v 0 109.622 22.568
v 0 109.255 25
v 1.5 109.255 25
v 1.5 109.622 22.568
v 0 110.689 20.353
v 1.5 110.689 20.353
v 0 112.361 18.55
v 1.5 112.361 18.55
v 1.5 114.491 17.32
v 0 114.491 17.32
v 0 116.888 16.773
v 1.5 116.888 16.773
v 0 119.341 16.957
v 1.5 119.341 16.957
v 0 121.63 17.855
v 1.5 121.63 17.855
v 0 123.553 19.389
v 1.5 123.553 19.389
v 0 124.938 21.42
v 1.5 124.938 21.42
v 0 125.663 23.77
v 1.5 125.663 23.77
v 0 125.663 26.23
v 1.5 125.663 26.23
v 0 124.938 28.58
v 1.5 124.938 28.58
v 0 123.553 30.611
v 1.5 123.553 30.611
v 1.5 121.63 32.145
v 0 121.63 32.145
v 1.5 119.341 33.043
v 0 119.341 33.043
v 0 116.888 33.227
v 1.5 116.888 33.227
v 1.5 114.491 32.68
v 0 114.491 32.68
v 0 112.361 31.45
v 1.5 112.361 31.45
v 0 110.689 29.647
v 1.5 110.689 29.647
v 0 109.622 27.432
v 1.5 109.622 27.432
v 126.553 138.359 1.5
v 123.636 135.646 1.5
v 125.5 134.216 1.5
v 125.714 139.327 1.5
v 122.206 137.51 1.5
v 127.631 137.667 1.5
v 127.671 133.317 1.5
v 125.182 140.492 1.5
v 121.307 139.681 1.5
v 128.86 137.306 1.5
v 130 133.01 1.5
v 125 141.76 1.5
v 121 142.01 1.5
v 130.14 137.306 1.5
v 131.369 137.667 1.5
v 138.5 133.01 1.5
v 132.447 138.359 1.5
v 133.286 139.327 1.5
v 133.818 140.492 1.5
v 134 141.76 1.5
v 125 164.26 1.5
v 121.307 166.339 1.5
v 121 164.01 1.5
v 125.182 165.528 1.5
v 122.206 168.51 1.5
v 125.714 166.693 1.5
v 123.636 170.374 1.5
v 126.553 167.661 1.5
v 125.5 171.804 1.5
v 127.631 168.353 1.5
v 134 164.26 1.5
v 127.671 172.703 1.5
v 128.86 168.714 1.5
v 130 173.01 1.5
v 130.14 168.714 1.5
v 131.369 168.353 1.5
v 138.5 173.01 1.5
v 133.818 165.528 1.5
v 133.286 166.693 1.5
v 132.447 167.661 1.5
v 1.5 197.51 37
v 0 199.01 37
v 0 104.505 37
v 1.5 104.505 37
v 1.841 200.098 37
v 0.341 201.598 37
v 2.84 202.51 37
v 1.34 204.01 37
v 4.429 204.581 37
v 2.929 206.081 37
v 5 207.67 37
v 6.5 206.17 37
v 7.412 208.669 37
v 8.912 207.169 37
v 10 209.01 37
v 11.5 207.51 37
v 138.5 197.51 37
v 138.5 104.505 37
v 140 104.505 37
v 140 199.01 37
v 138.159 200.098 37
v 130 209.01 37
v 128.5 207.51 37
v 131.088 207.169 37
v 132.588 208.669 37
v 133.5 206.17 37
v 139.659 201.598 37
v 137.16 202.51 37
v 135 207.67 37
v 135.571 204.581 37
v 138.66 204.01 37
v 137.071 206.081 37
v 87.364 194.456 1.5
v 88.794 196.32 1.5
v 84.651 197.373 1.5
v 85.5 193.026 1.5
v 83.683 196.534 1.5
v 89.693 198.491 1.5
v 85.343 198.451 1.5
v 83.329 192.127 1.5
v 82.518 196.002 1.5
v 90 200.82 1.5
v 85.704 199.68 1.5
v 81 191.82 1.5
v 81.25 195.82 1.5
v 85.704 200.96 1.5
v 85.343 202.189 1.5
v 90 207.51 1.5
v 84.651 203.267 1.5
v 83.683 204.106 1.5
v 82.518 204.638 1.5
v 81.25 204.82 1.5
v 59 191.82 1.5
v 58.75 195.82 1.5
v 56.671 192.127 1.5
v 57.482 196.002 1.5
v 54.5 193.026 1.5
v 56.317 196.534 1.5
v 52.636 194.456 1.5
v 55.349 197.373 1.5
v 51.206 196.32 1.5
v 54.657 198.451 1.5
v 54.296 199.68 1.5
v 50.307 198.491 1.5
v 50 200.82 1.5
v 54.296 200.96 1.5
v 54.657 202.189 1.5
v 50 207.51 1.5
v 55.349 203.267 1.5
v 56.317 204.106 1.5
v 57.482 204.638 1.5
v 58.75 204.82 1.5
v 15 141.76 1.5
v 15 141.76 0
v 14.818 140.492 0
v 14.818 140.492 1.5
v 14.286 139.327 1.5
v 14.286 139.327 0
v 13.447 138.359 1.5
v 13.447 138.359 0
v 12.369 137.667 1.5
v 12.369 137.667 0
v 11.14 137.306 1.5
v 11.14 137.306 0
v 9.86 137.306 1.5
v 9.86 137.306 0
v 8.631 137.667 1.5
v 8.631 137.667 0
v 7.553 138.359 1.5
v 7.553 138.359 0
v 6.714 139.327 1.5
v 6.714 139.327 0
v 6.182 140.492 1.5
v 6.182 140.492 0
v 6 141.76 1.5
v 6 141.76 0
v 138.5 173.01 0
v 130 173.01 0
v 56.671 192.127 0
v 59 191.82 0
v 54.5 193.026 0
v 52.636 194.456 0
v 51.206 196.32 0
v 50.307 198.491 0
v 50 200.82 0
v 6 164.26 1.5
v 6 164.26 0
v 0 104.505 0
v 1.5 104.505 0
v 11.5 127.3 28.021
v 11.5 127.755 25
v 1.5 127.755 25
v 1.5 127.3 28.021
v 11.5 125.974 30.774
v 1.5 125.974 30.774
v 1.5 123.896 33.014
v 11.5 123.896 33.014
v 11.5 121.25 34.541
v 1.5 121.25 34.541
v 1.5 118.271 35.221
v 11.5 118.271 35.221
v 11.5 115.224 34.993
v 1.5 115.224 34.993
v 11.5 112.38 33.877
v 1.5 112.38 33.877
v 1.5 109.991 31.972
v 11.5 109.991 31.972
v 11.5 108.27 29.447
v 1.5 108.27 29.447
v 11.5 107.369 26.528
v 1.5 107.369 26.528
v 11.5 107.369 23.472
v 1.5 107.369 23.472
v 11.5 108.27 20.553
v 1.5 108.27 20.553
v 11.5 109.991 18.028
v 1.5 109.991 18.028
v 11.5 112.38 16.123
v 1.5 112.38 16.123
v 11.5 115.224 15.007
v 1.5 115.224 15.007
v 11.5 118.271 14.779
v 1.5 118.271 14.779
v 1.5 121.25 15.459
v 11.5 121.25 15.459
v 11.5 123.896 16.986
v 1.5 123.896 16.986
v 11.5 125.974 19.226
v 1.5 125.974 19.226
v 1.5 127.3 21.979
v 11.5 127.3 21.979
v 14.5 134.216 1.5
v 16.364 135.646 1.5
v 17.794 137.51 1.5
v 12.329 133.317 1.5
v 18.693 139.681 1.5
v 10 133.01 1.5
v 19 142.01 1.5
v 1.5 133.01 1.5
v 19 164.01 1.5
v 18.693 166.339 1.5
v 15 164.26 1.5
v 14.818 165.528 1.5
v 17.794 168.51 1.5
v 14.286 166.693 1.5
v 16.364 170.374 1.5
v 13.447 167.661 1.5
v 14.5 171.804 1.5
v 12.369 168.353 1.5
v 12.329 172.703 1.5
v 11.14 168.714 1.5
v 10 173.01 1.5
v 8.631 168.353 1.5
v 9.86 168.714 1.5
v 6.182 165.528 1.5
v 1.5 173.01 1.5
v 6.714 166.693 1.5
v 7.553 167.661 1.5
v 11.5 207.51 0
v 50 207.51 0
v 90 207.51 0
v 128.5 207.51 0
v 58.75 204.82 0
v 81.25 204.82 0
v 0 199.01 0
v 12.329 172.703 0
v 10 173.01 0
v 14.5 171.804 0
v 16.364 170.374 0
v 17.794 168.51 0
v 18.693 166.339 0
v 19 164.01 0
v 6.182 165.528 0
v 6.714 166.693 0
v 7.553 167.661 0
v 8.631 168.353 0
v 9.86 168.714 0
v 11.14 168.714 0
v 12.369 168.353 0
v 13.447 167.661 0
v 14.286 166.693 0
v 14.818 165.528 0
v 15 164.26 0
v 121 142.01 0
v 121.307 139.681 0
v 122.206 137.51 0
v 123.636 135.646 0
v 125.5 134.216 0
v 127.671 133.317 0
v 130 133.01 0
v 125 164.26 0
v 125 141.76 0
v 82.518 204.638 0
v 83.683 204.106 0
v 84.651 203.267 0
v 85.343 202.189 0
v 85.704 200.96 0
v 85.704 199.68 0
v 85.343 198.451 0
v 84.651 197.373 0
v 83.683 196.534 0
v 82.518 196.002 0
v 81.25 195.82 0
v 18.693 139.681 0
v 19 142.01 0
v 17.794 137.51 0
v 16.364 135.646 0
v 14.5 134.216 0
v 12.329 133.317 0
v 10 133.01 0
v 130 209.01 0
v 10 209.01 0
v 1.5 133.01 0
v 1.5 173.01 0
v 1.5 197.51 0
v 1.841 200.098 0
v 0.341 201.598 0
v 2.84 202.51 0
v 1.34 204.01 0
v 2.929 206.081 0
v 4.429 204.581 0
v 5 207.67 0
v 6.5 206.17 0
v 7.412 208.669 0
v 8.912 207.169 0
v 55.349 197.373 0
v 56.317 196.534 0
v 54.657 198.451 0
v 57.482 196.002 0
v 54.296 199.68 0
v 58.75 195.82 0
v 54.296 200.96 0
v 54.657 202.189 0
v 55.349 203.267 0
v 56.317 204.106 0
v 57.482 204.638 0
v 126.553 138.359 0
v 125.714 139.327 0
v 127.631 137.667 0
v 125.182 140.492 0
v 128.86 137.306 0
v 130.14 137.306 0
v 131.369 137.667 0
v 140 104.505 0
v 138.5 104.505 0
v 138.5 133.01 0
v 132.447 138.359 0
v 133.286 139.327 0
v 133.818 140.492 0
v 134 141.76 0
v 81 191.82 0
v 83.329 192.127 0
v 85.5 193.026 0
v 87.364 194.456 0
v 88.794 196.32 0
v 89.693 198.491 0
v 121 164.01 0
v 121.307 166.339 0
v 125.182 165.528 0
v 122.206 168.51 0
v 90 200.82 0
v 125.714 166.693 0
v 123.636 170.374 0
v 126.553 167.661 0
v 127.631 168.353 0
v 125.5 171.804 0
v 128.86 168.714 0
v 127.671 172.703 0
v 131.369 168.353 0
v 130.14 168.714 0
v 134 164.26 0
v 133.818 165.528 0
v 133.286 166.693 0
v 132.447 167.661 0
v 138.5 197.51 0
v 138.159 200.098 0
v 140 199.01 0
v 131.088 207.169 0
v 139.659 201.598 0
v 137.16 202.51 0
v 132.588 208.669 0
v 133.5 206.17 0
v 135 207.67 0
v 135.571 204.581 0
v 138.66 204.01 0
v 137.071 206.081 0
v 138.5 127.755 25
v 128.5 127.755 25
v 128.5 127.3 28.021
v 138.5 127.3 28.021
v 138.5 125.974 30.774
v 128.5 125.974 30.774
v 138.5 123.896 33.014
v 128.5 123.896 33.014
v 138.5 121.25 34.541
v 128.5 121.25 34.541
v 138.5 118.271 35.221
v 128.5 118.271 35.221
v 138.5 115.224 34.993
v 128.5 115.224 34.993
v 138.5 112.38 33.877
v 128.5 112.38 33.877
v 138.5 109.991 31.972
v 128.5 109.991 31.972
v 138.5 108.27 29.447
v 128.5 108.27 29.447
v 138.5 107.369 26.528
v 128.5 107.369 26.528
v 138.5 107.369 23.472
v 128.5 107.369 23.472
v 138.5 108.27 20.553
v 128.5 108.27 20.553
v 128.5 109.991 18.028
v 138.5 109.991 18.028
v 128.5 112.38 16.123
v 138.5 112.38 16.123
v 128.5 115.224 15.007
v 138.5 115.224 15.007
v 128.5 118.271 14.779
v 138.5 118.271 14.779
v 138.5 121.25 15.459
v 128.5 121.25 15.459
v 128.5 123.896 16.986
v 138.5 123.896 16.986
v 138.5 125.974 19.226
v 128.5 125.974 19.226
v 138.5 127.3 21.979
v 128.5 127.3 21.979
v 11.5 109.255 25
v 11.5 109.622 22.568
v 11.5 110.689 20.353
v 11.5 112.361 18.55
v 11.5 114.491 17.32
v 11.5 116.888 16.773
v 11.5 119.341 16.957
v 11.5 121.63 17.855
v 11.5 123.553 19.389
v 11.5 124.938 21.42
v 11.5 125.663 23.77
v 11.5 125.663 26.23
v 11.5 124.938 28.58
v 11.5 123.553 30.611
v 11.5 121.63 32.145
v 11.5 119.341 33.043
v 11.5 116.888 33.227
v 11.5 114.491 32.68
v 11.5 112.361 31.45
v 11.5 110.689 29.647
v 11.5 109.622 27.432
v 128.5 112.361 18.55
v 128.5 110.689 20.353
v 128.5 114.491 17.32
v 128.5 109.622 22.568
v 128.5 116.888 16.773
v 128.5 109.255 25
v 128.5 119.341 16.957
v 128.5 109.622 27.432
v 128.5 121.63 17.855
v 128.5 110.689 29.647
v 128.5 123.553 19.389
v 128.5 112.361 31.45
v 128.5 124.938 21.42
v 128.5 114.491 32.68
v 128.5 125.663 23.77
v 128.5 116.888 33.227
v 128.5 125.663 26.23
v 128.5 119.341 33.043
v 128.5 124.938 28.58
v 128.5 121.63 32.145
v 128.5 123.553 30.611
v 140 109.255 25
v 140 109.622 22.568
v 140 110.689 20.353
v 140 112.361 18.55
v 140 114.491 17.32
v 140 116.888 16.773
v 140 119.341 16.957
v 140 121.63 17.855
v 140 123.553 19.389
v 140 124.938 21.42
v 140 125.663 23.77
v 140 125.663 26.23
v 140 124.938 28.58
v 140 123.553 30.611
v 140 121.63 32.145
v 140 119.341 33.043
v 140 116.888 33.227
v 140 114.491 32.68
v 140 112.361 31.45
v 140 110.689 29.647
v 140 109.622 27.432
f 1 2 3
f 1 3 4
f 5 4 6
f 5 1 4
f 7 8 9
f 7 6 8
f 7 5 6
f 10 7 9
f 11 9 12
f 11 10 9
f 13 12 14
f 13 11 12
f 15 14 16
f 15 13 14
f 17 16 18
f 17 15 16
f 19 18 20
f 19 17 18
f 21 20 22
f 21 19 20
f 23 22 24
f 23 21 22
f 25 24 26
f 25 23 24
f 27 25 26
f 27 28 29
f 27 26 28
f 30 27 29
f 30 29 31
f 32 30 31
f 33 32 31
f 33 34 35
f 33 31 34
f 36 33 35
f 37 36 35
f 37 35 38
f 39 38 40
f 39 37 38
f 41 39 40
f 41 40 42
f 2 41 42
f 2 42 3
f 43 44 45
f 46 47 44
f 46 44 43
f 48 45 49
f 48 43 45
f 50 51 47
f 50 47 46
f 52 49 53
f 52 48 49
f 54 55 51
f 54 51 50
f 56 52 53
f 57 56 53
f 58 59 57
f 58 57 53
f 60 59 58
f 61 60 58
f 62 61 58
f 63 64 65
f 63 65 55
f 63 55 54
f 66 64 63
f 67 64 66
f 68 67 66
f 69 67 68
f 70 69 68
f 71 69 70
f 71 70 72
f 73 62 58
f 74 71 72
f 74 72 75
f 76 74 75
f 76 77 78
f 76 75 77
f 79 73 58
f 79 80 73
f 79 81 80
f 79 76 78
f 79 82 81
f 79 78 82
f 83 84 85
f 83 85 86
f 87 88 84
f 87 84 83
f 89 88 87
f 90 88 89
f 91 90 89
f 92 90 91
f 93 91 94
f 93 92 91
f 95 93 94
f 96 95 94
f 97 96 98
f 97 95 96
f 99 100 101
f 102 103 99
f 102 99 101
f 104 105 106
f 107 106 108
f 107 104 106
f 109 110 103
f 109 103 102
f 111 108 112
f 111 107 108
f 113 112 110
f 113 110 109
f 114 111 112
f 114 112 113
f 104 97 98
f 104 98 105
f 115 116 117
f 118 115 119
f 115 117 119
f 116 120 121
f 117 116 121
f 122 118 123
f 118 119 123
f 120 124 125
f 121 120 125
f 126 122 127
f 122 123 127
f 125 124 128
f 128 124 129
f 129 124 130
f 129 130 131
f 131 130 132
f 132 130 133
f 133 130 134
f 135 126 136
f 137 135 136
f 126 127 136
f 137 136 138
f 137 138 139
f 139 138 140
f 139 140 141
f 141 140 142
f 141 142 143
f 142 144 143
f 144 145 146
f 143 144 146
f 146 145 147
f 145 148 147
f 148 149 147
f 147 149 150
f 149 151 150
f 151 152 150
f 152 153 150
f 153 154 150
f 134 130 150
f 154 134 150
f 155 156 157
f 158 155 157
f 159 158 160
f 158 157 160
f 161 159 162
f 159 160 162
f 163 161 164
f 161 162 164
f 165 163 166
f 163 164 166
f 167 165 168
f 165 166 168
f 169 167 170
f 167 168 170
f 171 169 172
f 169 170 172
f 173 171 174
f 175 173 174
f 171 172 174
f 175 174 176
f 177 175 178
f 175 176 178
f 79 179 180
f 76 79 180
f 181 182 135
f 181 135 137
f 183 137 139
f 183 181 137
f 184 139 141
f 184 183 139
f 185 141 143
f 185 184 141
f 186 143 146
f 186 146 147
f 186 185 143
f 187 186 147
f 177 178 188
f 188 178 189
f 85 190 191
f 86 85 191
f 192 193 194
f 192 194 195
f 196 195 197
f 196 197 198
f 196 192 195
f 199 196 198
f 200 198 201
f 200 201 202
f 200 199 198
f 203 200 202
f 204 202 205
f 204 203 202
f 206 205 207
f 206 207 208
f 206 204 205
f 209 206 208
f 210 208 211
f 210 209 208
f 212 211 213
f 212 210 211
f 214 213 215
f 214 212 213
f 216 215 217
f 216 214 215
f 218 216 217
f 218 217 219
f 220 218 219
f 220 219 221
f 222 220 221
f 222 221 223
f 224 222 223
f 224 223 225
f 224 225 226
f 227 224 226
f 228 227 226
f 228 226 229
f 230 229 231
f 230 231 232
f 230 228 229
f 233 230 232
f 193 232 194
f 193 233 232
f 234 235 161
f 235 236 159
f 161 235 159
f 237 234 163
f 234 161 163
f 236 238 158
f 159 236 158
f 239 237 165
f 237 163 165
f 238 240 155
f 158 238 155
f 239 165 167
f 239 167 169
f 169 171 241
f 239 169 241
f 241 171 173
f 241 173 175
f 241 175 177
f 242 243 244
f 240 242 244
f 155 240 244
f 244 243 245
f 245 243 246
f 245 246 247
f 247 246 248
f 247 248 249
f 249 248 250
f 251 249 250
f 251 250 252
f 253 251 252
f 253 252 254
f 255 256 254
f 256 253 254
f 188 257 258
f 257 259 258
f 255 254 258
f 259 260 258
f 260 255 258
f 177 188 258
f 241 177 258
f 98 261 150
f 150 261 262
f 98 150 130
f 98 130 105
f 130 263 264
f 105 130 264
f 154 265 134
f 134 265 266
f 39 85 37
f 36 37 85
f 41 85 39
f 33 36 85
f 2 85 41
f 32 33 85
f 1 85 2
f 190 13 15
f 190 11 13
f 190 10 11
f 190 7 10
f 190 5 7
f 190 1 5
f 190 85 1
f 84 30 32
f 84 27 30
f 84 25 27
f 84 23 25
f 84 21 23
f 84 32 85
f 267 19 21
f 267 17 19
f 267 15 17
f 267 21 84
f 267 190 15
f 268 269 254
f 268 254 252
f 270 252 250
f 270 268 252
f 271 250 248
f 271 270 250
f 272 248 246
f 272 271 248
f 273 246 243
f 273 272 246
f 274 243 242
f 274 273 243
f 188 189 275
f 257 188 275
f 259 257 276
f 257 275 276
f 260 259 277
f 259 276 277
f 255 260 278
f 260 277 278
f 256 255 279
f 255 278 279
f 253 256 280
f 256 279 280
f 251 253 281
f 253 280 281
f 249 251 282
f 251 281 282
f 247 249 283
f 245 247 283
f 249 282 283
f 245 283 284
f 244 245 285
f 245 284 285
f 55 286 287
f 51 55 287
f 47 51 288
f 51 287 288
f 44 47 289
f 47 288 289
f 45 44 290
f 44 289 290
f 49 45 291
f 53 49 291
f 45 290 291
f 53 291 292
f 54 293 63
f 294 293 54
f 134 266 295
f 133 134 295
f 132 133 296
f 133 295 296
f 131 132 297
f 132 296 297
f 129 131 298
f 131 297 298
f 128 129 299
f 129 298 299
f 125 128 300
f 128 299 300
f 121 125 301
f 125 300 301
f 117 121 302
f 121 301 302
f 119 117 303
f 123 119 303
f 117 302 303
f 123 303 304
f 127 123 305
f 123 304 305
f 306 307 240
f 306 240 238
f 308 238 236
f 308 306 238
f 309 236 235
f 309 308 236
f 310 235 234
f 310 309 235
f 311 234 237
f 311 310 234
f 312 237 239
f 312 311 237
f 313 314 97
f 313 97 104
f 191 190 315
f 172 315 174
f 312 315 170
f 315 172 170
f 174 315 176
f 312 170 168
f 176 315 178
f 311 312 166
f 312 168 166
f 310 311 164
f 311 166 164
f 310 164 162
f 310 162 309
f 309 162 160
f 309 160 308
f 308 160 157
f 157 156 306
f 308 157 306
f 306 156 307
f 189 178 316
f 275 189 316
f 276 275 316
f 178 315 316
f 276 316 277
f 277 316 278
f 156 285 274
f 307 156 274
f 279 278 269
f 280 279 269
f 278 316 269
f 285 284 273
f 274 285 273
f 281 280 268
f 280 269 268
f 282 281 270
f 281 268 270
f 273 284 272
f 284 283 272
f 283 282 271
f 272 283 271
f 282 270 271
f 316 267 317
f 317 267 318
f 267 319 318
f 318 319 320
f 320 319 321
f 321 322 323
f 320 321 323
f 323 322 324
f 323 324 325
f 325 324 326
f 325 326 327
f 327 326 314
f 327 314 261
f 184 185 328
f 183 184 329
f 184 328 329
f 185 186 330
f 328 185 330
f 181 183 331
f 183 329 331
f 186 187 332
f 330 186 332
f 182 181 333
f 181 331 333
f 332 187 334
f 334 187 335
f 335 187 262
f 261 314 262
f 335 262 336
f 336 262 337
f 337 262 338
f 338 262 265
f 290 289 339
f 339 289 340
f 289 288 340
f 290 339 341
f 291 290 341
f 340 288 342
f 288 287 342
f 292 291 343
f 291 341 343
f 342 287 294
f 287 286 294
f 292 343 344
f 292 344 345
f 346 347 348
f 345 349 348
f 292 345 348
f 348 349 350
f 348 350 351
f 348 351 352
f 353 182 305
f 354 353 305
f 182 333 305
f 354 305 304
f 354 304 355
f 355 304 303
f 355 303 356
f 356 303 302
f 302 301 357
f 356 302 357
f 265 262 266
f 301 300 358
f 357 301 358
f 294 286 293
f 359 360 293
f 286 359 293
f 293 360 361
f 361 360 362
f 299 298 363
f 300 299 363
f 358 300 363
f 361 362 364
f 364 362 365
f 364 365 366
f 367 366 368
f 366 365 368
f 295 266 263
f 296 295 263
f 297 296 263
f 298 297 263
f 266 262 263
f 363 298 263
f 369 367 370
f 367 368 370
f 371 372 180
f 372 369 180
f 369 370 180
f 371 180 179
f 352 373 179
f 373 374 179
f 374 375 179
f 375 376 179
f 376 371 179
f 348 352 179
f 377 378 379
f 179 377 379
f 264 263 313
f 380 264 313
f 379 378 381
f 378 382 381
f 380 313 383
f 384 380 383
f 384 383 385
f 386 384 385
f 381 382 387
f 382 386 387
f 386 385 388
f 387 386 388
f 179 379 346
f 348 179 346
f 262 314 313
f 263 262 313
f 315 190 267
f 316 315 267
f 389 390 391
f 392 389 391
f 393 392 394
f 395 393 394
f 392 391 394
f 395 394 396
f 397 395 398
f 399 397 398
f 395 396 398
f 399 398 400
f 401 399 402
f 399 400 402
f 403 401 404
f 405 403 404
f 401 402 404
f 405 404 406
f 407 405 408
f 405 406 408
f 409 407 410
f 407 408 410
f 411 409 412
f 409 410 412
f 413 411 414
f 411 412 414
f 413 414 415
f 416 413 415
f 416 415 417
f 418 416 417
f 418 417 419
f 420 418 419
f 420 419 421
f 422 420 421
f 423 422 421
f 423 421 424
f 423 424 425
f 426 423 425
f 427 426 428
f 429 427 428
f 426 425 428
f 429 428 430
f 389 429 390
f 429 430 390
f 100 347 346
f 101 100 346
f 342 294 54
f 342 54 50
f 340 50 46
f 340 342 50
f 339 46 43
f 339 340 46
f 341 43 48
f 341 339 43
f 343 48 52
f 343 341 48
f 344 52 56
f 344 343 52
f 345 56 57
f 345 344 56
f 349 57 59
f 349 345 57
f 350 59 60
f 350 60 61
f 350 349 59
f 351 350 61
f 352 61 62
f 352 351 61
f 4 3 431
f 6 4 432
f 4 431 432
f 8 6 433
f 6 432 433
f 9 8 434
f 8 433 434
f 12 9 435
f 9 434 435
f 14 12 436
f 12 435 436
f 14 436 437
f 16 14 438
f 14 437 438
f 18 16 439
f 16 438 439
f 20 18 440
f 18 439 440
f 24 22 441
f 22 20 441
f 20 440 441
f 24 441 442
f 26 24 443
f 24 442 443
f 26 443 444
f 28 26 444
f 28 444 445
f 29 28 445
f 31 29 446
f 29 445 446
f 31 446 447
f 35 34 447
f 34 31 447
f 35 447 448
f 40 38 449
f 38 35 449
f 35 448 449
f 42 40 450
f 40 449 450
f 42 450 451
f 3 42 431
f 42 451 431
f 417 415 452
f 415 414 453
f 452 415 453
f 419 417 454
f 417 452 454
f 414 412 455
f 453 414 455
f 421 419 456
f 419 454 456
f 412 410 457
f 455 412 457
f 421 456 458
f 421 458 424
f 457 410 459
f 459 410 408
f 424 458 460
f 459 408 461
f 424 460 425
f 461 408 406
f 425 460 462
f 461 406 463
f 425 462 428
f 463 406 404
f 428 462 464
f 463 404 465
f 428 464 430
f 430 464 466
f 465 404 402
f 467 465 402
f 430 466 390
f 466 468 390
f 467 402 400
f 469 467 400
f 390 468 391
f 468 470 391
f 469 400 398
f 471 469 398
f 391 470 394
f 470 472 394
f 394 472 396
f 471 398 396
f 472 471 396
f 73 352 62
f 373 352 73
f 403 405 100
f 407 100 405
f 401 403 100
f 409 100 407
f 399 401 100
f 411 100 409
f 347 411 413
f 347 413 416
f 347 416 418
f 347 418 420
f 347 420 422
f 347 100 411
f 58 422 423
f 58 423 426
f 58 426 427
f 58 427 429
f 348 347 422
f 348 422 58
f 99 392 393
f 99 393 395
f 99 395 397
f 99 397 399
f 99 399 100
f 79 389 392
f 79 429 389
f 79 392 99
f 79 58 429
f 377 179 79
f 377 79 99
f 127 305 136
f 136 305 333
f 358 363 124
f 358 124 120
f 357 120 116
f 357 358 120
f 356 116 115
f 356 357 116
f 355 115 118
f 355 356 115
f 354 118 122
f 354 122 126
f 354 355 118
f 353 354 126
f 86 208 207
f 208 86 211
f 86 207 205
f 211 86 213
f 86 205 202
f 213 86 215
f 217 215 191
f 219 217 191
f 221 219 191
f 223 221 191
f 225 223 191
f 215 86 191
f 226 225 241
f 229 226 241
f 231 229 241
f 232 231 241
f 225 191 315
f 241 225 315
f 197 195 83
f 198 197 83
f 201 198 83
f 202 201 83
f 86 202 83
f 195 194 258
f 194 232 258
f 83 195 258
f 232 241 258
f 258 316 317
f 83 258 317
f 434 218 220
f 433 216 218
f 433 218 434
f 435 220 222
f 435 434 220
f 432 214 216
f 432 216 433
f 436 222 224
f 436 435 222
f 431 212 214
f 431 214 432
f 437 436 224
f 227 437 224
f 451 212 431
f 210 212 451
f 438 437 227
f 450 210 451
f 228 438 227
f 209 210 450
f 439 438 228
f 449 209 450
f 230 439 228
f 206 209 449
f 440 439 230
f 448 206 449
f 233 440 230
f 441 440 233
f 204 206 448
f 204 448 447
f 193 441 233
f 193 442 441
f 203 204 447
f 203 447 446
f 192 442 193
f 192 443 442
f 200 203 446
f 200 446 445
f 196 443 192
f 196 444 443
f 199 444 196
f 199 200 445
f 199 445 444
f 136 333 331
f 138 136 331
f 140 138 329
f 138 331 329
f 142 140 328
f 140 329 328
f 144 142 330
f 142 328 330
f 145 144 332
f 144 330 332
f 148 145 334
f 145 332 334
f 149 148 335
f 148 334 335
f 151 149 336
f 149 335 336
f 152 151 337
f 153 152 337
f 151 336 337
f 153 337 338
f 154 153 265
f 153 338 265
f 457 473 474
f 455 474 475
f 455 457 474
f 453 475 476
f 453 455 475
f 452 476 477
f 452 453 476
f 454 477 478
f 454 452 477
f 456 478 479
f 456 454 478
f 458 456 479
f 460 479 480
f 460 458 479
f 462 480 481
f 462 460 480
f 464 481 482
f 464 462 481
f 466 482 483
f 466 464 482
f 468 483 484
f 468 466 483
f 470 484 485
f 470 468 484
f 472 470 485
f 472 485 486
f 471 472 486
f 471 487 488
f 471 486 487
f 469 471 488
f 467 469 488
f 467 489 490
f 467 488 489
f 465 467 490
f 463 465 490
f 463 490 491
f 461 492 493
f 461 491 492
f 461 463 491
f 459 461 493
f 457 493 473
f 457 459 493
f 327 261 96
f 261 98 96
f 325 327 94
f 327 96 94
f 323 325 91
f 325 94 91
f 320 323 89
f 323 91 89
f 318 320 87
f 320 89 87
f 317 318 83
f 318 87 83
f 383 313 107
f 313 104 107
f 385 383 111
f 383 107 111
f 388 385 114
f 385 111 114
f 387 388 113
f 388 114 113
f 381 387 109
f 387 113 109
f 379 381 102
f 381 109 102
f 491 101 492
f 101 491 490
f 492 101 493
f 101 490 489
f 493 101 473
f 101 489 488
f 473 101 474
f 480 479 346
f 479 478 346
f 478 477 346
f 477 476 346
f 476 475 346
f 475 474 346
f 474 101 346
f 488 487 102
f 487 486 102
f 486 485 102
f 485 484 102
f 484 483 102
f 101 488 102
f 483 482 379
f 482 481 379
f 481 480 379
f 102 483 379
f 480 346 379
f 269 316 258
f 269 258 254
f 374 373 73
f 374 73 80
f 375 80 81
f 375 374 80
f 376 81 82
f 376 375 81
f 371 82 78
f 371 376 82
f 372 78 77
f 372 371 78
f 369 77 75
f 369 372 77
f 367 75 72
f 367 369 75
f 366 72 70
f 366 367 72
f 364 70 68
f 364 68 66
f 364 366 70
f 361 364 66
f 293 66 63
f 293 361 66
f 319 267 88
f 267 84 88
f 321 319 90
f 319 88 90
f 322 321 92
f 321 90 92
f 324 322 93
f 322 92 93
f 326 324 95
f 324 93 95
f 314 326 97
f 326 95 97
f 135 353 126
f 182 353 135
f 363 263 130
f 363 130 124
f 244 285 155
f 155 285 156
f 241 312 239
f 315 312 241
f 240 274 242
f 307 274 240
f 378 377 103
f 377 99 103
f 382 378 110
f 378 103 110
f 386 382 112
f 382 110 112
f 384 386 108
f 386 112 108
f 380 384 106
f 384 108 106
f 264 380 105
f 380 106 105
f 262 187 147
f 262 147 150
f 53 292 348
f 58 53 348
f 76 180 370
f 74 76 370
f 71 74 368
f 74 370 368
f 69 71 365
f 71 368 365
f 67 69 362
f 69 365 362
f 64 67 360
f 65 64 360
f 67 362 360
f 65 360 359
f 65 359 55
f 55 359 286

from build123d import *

# Parameters (mm, degrees)
SKIZZE1_W                            = 140
SKIZZE1_H                            = 209.01
SKIZZE1_W_2                          = 137
SKIZZE1_H_2                          = 206.01
AUFSATZ_LINEAR_AUSTRAGEN1_DEPTH      = 37
VERRUNDUNG1_R                        = 10
SCHNITT_LINEAR_AUSTRAGEN2_DEPTH      = 255.27186258
SCHNITT_LINEAR_AUSTRAGEN2_DEPTH_BACK = 255.27186258
SKIZZE4_R                            = 8.25
AUFSATZ_LINEAR_AUSTRAGEN3_DEPTH      = 1.5
SCHNITT_LINEAR_AUSTRAGEN3_DEPTH      = 255.057926662
SCHNITT_LINEAR_AUSTRAGEN3_DEPTH_BACK = 255.057926662
SKIZZE6_W                            = 230.516002865
SKIZZE6_H                            = 119.565202556
AUFSATZ_LINEAR_START                 = 10
SKIZZE8_R                            = 10.25
SKIZZE8_R_2                          = 8.25
AUFSATZ_LINEAR_AUSTRAGEN5_DEPTH      = 10


with BuildPart() as part:
    # Skizze1 → Aufsatz-Linear austragen1 (new body)
    with BuildSketch(Plane.XY):
        with Locations((70, 104.505)):
            Rectangle(SKIZZE1_W, SKIZZE1_H)
        with Locations((70, 104.505)):
            Rectangle(SKIZZE1_W_2, SKIZZE1_H_2, mode=Mode.SUBTRACT)
    extrude(amount=AUFSATZ_LINEAR_AUSTRAGEN1_DEPTH)

    # Verrundung1
    verrundung1_edges = [part.edges().sort_by_distance(p)[0] for p in [
        (1.5, 207.51, 18.5),
        (1.5, 1.5, 18.5),
        (138.5, 1.5, 18.5),
        (138.5, 207.51, 18.5),
        (0, 209.01, 18.5),
        (140, 209.01, 18.5),
        (140, 0, 18.5),
        (0, 0, 18.5),
    ]]
    fillet(verrundung1_edges, radius=VERRUNDUNG1_R)

    # Skizze4 → Schnitt-Linear austragen2 (cut, two sides: drawn at the far end of the back side and taken through both)
    with BuildSketch(Plane(origin=(140, 0, 0), x_dir=(0, 0, -1), z_dir=(1, 0, 0)).offset(-SCHNITT_LINEAR_AUSTRAGEN2_DEPTH_BACK)):
        with Locations(Location((-25, 117.505, 0), (0, 0, 270))):
            Circle(SKIZZE4_R)
        with Locations(Location((-25, 91.505, 0), (0, 0, 270))):
            Circle(SKIZZE4_R)
    extrude(amount=SCHNITT_LINEAR_AUSTRAGEN2_DEPTH + SCHNITT_LINEAR_AUSTRAGEN2_DEPTH_BACK, mode=Mode.SUBTRACT)

    # Skizze5 → Aufsatz-Linear austragen3 (add)
    # profile 1 of 5: a face of its own
    with BuildSketch(Plane(origin=(0, 0, 0), x_dir=(-1, 0, 0), z_dir=(0, 0, -1))):
        with BuildLine():
            Line((-140, 173.01), (-130, 173.01))
            ThreePointArc((-130, 173.01), (-123.636038969, 170.373961031), (-121, 164.01))
            Line((-121, 164.01), (-121, 142.01))
            ThreePointArc((-121, 142.01), (-123.636038969, 135.646038969), (-130, 133.01))
            Line((-130, 133.01), (-140, 133.01))
            Line((-140, 133.01), (-140, 173.01))
        make_face()
        with BuildLine():
            Line((-125, 164.26), (-125, 141.76))
            ThreePointArc((-125, 141.76), (-129.5, 137.26), (-134, 141.76))
            Line((-134, 141.76), (-134, 164.26))
            ThreePointArc((-134, 164.26), (-129.5, 168.76), (-125, 164.26))
        make_face(mode=Mode.SUBTRACT)
    # profile 2 of 5: a face of its own
    with BuildSketch(Plane(origin=(0, 0, 0), x_dir=(-1, 0, 0), z_dir=(0, 0, -1))):
        with BuildLine():
            Line((-90, 209.01), (-90, 200.82))
            ThreePointArc((-90, 200.82), (-87.363961031, 194.456038969), (-81, 191.82))
            Line((-81, 191.82), (-59, 191.82))
            ThreePointArc((-59, 191.82), (-52.636038969, 194.456038969), (-50, 200.82))
            Line((-50, 200.82), (-50, 209.01))
            Line((-50, 209.01), (-90, 209.01))
        make_face()
        with BuildLine():
            Line((-58.75, 204.82), (-81.25, 204.82))
            ThreePointArc((-81.25, 204.82), (-85.75, 200.32), (-81.25, 195.82))
            Line((-81.25, 195.82), (-58.75, 195.82))
            ThreePointArc((-58.75, 195.82), (-54.25, 200.32), (-58.75, 204.82))
        make_face(mode=Mode.SUBTRACT)
    # profile 3 of 5: a face of its own
    with BuildSketch(Plane(origin=(0, 0, 0), x_dir=(-1, 0, 0), z_dir=(0, 0, -1))):
        with BuildLine():
            Line((-19, 164.01), (-19, 142.01))
            ThreePointArc((-19, 142.01), (-16.363961031, 135.646038969), (-10, 133.01))
            Line((-10, 133.01), (0, 133.01))
            Line((0, 133.01), (0, 173.01))
            Line((0, 173.01), (-10, 173.01))
            ThreePointArc((-10, 173.01), (-16.363961031, 170.373961031), (-19, 164.01))
        make_face()
        with BuildLine():
            Line((-15, 164.26), (-15, 141.76))
            ThreePointArc((-15, 141.76), (-10.5, 137.26), (-6, 141.76))
            Line((-6, 141.76), (-6, 164.26))
            ThreePointArc((-6, 164.26), (-10.5, 168.76), (-15, 164.26))
        make_face(mode=Mode.SUBTRACT)
    # profile 4 of 5: a face of its own
    with BuildSketch(Plane(origin=(0, 0, 0), x_dir=(-1, 0, 0), z_dir=(0, 0, -1))):
        with BuildLine():
            Line((0, 36), (-10, 36))
            ThreePointArc((-10, 36), (-16.363961031, 38.636038969), (-19, 45))
            Line((-19, 45), (-19, 67))
            ThreePointArc((-19, 67), (-16.363961031, 73.363961031), (-10, 76))
            Line((-10, 76), (0, 76))
            Line((0, 76), (0, 36))
        make_face()
        with BuildLine():
            Line((-15, 44.75), (-15, 67.25))
            ThreePointArc((-15, 67.25), (-10.5, 71.75), (-6, 67.25))
            Line((-6, 67.25), (-6, 44.75))
            ThreePointArc((-6, 44.75), (-10.5, 40.25), (-15, 44.75))
        make_face(mode=Mode.SUBTRACT)
    # profile 5 of 5: a face of its own
    with BuildSketch(Plane(origin=(0, 0, 0), x_dir=(-1, 0, 0), z_dir=(0, 0, -1))):
        with BuildLine():
            Line((-121, 45), (-121, 67))
            ThreePointArc((-121, 67), (-123.636038969, 73.363961031), (-130, 76))
            Line((-130, 76), (-140, 76))
            Line((-140, 76), (-140, 36))
            Line((-140, 36), (-130, 36))
            ThreePointArc((-130, 36), (-123.636038969, 38.636038969), (-121, 45))
        make_face()
        with BuildLine():
            Line((-125, 44.75), (-125, 67.25))
            ThreePointArc((-125, 67.25), (-129.5, 71.75), (-134, 67.25))
            Line((-134, 67.25), (-134, 44.75))
            ThreePointArc((-134, 44.75), (-129.5, 40.25), (-125, 44.75))
        make_face(mode=Mode.SUBTRACT)
    extrude(amount=-AUFSATZ_LINEAR_AUSTRAGEN3_DEPTH)

    # Skizze6 → Schnitt-Linear austragen3 (cut, two sides: drawn at the far end of the back side and taken through both)
    with BuildSketch(Plane.XY.offset(1.5).offset(-SCHNITT_LINEAR_AUSTRAGEN3_DEPTH_BACK)):
        with Locations((84.29357918, 44.722398722)):
            Rectangle(SKIZZE6_W, SKIZZE6_H)
    extrude(amount=SCHNITT_LINEAR_AUSTRAGEN3_DEPTH + SCHNITT_LINEAR_AUSTRAGEN3_DEPTH_BACK, mode=Mode.SUBTRACT)

    # Skizze8 → Aufsatz-Linear austragen5 (add)
    with BuildSketch(Plane(origin=(1.5, 0, 0), x_dir=(0, 0, -1), z_dir=(1, 0, 0)).offset(AUFSATZ_LINEAR_START)):
        with Locations(Location((-25, 117.505, 0), (0, 0, 90))):
            Circle(SKIZZE8_R)
        with Locations(Location((-25, 117.505, 0), (0, 0, 270))):
            Circle(SKIZZE8_R_2, mode=Mode.SUBTRACT)
    aufsatz_linear_austragen5 = extrude(amount=-AUFSATZ_LINEAR_AUSTRAGEN5_DEPTH)

    # Spiegeln1: Aufsatz-Linear austragen5 across plane
    add(aufsatz_linear_austragen5.mirror(Plane.ZY.offset(-70)))


solid = part.part
